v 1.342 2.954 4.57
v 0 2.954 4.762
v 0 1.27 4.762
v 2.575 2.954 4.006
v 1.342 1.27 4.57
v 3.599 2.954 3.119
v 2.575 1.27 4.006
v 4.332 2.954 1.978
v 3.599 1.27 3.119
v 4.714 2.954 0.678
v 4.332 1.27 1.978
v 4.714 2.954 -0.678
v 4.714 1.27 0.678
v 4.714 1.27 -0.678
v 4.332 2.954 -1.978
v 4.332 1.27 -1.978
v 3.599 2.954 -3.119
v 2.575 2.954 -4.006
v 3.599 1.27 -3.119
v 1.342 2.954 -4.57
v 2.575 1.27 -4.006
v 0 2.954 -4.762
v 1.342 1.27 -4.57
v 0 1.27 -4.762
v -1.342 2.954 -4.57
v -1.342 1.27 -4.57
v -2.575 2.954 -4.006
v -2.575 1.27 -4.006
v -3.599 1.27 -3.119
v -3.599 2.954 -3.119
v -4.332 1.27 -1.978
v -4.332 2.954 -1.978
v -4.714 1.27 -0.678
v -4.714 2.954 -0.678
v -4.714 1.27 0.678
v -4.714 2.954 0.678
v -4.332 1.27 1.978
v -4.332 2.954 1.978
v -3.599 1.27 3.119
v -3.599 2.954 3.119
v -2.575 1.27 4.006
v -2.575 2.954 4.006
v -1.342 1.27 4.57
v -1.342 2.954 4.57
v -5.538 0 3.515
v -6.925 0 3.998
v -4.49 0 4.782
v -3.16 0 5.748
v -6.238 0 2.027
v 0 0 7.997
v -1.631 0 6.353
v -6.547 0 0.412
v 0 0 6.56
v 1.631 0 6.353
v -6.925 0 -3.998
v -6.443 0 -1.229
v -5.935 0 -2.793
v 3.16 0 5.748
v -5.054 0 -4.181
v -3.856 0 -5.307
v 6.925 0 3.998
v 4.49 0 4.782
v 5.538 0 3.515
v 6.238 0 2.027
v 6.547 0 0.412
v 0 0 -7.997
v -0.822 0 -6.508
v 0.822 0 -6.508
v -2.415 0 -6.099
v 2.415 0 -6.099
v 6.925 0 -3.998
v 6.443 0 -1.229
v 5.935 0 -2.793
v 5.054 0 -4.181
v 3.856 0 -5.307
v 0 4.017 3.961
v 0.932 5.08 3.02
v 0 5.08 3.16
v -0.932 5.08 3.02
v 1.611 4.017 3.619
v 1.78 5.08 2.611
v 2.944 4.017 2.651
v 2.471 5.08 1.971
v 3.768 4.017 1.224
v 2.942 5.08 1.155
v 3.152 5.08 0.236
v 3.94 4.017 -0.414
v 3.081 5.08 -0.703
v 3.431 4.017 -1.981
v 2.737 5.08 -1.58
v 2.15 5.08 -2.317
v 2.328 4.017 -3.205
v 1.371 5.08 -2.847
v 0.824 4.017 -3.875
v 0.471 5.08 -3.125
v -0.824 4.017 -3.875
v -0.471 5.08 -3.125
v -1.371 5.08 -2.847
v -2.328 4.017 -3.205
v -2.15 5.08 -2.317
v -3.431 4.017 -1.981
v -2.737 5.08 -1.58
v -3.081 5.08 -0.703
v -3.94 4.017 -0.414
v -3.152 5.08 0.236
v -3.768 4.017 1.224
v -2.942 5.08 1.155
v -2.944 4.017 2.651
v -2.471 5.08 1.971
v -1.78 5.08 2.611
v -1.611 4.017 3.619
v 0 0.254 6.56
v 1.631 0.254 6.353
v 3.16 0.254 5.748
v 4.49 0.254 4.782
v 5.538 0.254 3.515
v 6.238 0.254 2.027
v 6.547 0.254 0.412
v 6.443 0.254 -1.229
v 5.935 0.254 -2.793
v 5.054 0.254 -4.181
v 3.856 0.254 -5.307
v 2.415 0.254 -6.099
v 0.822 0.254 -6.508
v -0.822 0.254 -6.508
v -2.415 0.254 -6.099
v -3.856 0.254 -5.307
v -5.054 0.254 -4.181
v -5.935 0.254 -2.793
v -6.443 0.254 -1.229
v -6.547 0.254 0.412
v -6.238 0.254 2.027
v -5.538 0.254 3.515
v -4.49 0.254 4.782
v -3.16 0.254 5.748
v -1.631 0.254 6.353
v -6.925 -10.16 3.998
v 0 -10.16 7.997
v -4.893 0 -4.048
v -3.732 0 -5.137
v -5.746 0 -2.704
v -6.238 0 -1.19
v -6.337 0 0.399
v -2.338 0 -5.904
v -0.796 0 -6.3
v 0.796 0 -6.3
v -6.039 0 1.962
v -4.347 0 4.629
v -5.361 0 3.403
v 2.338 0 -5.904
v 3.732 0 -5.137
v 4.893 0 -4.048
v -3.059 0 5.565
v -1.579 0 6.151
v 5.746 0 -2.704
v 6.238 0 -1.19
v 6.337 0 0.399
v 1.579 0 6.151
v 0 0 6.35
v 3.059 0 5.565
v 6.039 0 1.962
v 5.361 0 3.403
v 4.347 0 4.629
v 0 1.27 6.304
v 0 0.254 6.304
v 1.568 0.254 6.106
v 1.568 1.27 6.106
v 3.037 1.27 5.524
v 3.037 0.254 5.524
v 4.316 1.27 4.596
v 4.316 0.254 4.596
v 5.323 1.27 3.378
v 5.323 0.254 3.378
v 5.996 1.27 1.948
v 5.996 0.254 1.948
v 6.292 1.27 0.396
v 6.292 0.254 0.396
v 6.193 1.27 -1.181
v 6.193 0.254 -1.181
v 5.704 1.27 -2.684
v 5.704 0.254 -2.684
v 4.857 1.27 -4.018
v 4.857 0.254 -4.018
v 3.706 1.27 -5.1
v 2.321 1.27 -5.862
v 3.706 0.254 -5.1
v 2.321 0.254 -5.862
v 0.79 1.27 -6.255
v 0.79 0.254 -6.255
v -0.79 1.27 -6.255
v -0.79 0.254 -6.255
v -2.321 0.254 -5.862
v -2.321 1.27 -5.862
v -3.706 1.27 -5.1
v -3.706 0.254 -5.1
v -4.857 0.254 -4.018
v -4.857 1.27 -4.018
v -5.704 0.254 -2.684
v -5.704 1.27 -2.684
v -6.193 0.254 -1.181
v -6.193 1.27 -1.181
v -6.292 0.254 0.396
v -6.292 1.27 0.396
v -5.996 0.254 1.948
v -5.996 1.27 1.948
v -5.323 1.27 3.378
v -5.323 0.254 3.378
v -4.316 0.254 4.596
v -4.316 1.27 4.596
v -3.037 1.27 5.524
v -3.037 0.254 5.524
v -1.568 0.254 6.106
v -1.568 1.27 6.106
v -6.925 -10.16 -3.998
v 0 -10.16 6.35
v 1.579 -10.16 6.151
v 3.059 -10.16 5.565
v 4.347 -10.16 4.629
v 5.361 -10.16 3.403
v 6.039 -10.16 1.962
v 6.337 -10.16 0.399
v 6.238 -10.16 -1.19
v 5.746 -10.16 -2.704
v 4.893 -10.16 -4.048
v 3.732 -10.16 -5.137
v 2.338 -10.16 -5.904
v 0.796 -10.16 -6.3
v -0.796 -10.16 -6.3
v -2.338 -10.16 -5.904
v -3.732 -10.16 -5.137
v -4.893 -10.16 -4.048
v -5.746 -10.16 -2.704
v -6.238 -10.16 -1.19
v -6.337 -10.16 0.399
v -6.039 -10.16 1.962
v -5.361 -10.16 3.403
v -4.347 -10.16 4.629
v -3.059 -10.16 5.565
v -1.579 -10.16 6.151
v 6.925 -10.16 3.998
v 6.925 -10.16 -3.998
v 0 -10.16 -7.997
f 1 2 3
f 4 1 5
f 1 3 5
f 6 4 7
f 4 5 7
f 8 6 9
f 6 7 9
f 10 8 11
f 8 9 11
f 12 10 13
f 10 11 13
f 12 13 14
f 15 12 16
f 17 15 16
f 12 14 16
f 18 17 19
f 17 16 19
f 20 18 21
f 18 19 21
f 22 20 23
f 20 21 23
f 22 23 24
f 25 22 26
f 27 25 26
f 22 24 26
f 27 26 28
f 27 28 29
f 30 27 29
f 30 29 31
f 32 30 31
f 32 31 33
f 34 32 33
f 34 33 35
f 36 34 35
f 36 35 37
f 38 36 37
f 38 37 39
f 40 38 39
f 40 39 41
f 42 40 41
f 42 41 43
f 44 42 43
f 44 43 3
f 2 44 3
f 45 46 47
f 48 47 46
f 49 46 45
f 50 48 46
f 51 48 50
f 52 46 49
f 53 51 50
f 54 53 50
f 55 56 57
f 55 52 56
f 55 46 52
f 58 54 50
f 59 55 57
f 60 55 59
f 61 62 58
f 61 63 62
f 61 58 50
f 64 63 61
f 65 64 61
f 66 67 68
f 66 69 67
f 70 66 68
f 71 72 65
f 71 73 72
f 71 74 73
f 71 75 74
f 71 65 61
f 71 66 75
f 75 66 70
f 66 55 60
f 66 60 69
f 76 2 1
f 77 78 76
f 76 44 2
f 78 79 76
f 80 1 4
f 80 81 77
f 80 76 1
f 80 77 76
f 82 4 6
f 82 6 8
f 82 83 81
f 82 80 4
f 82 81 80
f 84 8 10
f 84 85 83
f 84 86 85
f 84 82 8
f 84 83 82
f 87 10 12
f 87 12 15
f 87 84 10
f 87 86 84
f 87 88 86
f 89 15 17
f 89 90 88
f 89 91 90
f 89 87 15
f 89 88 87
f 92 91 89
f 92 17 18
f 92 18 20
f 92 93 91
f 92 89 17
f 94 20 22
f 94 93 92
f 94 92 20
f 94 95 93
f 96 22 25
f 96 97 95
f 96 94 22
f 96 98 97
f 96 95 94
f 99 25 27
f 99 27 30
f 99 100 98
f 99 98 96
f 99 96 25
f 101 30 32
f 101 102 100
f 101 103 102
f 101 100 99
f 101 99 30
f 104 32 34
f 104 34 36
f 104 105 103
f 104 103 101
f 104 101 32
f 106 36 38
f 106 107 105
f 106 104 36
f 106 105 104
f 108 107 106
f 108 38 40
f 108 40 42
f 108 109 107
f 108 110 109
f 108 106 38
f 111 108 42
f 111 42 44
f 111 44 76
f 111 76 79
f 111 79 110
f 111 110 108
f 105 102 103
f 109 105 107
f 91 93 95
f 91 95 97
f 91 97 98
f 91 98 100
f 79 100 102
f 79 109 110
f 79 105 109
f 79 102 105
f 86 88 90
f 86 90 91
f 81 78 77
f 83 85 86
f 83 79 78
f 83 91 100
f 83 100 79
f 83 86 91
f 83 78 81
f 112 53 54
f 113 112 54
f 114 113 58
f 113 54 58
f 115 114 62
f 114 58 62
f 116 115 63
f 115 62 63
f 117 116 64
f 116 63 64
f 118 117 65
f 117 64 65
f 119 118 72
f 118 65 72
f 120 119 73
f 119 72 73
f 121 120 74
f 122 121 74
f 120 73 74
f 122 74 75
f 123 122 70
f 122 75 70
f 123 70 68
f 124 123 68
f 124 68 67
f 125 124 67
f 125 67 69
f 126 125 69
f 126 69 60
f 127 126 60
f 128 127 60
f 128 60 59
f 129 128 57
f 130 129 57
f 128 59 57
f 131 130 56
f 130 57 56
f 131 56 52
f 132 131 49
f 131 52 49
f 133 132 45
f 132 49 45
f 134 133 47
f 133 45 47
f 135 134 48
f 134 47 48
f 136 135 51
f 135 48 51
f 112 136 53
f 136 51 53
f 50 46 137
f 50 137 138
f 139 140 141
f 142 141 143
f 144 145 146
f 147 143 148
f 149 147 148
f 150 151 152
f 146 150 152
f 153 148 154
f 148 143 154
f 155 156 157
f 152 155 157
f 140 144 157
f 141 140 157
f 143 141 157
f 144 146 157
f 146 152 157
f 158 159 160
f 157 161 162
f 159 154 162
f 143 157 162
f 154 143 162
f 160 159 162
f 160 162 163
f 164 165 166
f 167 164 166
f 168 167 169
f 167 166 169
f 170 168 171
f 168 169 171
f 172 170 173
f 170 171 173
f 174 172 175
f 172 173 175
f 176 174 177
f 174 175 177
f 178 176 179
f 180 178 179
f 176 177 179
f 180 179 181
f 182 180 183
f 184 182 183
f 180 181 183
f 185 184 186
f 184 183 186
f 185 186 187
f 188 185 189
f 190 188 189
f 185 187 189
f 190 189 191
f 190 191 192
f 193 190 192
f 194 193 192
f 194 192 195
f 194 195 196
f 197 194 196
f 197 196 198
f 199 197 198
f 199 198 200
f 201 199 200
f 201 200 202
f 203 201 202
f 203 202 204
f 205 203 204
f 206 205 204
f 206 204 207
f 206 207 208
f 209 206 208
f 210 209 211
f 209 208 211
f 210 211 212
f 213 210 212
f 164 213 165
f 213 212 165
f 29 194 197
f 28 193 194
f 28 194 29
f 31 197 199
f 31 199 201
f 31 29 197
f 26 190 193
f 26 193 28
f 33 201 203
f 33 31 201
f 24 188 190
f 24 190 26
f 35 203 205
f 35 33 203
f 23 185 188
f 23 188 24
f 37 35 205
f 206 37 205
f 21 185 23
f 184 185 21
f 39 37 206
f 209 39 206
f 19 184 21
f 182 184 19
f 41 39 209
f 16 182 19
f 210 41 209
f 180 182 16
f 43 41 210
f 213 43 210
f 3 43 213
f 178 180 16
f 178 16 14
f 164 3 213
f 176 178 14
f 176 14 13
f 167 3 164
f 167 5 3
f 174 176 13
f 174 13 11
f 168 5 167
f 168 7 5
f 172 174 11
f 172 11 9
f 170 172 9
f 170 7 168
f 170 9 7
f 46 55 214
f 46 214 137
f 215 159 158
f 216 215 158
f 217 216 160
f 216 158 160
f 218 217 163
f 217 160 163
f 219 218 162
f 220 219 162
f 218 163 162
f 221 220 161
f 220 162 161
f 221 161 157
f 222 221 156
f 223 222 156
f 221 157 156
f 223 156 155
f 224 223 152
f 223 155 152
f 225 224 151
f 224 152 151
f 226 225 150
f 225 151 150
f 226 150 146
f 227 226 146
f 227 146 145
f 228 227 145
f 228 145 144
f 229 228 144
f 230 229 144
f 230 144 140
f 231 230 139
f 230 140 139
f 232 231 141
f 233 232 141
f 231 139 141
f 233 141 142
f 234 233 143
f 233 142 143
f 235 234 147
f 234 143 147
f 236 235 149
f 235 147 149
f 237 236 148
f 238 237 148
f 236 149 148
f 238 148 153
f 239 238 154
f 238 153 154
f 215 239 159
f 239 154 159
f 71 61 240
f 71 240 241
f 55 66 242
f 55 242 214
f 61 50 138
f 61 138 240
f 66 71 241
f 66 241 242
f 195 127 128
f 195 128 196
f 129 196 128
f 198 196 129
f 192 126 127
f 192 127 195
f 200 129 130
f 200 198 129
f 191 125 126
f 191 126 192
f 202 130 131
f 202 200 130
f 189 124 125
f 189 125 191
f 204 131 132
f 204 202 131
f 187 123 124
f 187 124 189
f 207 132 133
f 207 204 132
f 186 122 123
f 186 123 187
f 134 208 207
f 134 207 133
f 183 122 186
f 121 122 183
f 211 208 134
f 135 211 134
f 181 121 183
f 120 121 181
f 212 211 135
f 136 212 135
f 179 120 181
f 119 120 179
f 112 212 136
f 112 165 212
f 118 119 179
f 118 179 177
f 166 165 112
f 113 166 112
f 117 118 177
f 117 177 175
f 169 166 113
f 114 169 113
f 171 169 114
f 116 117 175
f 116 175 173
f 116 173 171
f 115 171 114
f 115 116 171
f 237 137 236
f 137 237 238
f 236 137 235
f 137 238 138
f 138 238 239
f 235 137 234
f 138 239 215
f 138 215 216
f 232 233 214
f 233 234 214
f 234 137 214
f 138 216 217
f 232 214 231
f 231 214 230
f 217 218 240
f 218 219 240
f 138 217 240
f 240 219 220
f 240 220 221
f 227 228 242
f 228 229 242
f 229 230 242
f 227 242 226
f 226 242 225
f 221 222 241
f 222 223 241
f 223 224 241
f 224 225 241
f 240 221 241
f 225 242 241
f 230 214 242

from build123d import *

# Parameters (mm, degrees)
SKETCH1_R           = 4.7625
BOSS_EXTRUDE1_DEPTH = 5.08
SKETCH1_4_R         = 6.35
BOSS_EXTRUDE4_DEPTH = 10.16
SKETCH7_R           = 6.304229739
BOSS_EXTRUDE5_DEPTH = 1.27
CHAMFER1_SIZE       = 2.126000066
CHAMFER1_SIZE2      = 1.60205596
SKETCH8_R           = 6.559510295
BOSS_EXTRUDE6_DEPTH = 0.254


with BuildPart() as part:
    # Sketch1 → Boss-Extrude1 (new body)
    with BuildSketch(Plane(origin=(0, 0, 0), x_dir=(1, 0, 0), z_dir=(0, 1, 0))):
        Circle(SKETCH1_R)
    extrude(amount=BOSS_EXTRUDE1_DEPTH)

    # Sketch7 → Boss-Extrude5 (add)
    with BuildSketch(Plane(origin=(0, 0, 0), x_dir=(1, 0, 0), z_dir=(0, 1, 0))):
        Circle(SKETCH7_R)
    extrude(amount=BOSS_EXTRUDE5_DEPTH)

    # Chamfer1
    chamfer1_edges = [part.edges().sort_by_distance(p)[0] for p in [
        (-4.7625, 5.08, 0),
    ]]
    chamfer1_side = [part.faces().sort_by_distance(p)[0] for p in [
        (-4.7625, 3.175, 0),
    ]]
    chamfer(chamfer1_edges, length=CHAMFER1_SIZE, length2=CHAMFER1_SIZE2, reference=chamfer1_side[0])



with BuildPart() as body_2:
    # Sketch1<4> → Boss-Extrude4 (new body)
    with BuildSketch(Plane(origin=(0, 0, 0), x_dir=(1, 0, 0), z_dir=(0, 1, 0))):
        Polygon((6.925488061, 3.998432396), (0, 7.996864793), (-6.925488061, 3.998432396), (-6.925488061, -3.998432396), (0, -7.996864793), (6.925488061, -3.998432396), align=None)
        Circle(SKETCH1_4_R, mode=Mode.SUBTRACT)
    extrude(amount=-BOSS_EXTRUDE4_DEPTH)


with BuildPart() as part_1:
    add(part.part)

    add(body_2.part)  # Boss-Extrude6 merges body 2
    # Sketch8 → Boss-Extrude6 (add)
    with BuildSketch(Plane(origin=(0, 0, 0), x_dir=(1, 0, 0), z_dir=(0, 1, 0))):
        Circle(SKETCH8_R)
    extrude(amount=BOSS_EXTRUDE6_DEPTH)


solid = part_1.part
